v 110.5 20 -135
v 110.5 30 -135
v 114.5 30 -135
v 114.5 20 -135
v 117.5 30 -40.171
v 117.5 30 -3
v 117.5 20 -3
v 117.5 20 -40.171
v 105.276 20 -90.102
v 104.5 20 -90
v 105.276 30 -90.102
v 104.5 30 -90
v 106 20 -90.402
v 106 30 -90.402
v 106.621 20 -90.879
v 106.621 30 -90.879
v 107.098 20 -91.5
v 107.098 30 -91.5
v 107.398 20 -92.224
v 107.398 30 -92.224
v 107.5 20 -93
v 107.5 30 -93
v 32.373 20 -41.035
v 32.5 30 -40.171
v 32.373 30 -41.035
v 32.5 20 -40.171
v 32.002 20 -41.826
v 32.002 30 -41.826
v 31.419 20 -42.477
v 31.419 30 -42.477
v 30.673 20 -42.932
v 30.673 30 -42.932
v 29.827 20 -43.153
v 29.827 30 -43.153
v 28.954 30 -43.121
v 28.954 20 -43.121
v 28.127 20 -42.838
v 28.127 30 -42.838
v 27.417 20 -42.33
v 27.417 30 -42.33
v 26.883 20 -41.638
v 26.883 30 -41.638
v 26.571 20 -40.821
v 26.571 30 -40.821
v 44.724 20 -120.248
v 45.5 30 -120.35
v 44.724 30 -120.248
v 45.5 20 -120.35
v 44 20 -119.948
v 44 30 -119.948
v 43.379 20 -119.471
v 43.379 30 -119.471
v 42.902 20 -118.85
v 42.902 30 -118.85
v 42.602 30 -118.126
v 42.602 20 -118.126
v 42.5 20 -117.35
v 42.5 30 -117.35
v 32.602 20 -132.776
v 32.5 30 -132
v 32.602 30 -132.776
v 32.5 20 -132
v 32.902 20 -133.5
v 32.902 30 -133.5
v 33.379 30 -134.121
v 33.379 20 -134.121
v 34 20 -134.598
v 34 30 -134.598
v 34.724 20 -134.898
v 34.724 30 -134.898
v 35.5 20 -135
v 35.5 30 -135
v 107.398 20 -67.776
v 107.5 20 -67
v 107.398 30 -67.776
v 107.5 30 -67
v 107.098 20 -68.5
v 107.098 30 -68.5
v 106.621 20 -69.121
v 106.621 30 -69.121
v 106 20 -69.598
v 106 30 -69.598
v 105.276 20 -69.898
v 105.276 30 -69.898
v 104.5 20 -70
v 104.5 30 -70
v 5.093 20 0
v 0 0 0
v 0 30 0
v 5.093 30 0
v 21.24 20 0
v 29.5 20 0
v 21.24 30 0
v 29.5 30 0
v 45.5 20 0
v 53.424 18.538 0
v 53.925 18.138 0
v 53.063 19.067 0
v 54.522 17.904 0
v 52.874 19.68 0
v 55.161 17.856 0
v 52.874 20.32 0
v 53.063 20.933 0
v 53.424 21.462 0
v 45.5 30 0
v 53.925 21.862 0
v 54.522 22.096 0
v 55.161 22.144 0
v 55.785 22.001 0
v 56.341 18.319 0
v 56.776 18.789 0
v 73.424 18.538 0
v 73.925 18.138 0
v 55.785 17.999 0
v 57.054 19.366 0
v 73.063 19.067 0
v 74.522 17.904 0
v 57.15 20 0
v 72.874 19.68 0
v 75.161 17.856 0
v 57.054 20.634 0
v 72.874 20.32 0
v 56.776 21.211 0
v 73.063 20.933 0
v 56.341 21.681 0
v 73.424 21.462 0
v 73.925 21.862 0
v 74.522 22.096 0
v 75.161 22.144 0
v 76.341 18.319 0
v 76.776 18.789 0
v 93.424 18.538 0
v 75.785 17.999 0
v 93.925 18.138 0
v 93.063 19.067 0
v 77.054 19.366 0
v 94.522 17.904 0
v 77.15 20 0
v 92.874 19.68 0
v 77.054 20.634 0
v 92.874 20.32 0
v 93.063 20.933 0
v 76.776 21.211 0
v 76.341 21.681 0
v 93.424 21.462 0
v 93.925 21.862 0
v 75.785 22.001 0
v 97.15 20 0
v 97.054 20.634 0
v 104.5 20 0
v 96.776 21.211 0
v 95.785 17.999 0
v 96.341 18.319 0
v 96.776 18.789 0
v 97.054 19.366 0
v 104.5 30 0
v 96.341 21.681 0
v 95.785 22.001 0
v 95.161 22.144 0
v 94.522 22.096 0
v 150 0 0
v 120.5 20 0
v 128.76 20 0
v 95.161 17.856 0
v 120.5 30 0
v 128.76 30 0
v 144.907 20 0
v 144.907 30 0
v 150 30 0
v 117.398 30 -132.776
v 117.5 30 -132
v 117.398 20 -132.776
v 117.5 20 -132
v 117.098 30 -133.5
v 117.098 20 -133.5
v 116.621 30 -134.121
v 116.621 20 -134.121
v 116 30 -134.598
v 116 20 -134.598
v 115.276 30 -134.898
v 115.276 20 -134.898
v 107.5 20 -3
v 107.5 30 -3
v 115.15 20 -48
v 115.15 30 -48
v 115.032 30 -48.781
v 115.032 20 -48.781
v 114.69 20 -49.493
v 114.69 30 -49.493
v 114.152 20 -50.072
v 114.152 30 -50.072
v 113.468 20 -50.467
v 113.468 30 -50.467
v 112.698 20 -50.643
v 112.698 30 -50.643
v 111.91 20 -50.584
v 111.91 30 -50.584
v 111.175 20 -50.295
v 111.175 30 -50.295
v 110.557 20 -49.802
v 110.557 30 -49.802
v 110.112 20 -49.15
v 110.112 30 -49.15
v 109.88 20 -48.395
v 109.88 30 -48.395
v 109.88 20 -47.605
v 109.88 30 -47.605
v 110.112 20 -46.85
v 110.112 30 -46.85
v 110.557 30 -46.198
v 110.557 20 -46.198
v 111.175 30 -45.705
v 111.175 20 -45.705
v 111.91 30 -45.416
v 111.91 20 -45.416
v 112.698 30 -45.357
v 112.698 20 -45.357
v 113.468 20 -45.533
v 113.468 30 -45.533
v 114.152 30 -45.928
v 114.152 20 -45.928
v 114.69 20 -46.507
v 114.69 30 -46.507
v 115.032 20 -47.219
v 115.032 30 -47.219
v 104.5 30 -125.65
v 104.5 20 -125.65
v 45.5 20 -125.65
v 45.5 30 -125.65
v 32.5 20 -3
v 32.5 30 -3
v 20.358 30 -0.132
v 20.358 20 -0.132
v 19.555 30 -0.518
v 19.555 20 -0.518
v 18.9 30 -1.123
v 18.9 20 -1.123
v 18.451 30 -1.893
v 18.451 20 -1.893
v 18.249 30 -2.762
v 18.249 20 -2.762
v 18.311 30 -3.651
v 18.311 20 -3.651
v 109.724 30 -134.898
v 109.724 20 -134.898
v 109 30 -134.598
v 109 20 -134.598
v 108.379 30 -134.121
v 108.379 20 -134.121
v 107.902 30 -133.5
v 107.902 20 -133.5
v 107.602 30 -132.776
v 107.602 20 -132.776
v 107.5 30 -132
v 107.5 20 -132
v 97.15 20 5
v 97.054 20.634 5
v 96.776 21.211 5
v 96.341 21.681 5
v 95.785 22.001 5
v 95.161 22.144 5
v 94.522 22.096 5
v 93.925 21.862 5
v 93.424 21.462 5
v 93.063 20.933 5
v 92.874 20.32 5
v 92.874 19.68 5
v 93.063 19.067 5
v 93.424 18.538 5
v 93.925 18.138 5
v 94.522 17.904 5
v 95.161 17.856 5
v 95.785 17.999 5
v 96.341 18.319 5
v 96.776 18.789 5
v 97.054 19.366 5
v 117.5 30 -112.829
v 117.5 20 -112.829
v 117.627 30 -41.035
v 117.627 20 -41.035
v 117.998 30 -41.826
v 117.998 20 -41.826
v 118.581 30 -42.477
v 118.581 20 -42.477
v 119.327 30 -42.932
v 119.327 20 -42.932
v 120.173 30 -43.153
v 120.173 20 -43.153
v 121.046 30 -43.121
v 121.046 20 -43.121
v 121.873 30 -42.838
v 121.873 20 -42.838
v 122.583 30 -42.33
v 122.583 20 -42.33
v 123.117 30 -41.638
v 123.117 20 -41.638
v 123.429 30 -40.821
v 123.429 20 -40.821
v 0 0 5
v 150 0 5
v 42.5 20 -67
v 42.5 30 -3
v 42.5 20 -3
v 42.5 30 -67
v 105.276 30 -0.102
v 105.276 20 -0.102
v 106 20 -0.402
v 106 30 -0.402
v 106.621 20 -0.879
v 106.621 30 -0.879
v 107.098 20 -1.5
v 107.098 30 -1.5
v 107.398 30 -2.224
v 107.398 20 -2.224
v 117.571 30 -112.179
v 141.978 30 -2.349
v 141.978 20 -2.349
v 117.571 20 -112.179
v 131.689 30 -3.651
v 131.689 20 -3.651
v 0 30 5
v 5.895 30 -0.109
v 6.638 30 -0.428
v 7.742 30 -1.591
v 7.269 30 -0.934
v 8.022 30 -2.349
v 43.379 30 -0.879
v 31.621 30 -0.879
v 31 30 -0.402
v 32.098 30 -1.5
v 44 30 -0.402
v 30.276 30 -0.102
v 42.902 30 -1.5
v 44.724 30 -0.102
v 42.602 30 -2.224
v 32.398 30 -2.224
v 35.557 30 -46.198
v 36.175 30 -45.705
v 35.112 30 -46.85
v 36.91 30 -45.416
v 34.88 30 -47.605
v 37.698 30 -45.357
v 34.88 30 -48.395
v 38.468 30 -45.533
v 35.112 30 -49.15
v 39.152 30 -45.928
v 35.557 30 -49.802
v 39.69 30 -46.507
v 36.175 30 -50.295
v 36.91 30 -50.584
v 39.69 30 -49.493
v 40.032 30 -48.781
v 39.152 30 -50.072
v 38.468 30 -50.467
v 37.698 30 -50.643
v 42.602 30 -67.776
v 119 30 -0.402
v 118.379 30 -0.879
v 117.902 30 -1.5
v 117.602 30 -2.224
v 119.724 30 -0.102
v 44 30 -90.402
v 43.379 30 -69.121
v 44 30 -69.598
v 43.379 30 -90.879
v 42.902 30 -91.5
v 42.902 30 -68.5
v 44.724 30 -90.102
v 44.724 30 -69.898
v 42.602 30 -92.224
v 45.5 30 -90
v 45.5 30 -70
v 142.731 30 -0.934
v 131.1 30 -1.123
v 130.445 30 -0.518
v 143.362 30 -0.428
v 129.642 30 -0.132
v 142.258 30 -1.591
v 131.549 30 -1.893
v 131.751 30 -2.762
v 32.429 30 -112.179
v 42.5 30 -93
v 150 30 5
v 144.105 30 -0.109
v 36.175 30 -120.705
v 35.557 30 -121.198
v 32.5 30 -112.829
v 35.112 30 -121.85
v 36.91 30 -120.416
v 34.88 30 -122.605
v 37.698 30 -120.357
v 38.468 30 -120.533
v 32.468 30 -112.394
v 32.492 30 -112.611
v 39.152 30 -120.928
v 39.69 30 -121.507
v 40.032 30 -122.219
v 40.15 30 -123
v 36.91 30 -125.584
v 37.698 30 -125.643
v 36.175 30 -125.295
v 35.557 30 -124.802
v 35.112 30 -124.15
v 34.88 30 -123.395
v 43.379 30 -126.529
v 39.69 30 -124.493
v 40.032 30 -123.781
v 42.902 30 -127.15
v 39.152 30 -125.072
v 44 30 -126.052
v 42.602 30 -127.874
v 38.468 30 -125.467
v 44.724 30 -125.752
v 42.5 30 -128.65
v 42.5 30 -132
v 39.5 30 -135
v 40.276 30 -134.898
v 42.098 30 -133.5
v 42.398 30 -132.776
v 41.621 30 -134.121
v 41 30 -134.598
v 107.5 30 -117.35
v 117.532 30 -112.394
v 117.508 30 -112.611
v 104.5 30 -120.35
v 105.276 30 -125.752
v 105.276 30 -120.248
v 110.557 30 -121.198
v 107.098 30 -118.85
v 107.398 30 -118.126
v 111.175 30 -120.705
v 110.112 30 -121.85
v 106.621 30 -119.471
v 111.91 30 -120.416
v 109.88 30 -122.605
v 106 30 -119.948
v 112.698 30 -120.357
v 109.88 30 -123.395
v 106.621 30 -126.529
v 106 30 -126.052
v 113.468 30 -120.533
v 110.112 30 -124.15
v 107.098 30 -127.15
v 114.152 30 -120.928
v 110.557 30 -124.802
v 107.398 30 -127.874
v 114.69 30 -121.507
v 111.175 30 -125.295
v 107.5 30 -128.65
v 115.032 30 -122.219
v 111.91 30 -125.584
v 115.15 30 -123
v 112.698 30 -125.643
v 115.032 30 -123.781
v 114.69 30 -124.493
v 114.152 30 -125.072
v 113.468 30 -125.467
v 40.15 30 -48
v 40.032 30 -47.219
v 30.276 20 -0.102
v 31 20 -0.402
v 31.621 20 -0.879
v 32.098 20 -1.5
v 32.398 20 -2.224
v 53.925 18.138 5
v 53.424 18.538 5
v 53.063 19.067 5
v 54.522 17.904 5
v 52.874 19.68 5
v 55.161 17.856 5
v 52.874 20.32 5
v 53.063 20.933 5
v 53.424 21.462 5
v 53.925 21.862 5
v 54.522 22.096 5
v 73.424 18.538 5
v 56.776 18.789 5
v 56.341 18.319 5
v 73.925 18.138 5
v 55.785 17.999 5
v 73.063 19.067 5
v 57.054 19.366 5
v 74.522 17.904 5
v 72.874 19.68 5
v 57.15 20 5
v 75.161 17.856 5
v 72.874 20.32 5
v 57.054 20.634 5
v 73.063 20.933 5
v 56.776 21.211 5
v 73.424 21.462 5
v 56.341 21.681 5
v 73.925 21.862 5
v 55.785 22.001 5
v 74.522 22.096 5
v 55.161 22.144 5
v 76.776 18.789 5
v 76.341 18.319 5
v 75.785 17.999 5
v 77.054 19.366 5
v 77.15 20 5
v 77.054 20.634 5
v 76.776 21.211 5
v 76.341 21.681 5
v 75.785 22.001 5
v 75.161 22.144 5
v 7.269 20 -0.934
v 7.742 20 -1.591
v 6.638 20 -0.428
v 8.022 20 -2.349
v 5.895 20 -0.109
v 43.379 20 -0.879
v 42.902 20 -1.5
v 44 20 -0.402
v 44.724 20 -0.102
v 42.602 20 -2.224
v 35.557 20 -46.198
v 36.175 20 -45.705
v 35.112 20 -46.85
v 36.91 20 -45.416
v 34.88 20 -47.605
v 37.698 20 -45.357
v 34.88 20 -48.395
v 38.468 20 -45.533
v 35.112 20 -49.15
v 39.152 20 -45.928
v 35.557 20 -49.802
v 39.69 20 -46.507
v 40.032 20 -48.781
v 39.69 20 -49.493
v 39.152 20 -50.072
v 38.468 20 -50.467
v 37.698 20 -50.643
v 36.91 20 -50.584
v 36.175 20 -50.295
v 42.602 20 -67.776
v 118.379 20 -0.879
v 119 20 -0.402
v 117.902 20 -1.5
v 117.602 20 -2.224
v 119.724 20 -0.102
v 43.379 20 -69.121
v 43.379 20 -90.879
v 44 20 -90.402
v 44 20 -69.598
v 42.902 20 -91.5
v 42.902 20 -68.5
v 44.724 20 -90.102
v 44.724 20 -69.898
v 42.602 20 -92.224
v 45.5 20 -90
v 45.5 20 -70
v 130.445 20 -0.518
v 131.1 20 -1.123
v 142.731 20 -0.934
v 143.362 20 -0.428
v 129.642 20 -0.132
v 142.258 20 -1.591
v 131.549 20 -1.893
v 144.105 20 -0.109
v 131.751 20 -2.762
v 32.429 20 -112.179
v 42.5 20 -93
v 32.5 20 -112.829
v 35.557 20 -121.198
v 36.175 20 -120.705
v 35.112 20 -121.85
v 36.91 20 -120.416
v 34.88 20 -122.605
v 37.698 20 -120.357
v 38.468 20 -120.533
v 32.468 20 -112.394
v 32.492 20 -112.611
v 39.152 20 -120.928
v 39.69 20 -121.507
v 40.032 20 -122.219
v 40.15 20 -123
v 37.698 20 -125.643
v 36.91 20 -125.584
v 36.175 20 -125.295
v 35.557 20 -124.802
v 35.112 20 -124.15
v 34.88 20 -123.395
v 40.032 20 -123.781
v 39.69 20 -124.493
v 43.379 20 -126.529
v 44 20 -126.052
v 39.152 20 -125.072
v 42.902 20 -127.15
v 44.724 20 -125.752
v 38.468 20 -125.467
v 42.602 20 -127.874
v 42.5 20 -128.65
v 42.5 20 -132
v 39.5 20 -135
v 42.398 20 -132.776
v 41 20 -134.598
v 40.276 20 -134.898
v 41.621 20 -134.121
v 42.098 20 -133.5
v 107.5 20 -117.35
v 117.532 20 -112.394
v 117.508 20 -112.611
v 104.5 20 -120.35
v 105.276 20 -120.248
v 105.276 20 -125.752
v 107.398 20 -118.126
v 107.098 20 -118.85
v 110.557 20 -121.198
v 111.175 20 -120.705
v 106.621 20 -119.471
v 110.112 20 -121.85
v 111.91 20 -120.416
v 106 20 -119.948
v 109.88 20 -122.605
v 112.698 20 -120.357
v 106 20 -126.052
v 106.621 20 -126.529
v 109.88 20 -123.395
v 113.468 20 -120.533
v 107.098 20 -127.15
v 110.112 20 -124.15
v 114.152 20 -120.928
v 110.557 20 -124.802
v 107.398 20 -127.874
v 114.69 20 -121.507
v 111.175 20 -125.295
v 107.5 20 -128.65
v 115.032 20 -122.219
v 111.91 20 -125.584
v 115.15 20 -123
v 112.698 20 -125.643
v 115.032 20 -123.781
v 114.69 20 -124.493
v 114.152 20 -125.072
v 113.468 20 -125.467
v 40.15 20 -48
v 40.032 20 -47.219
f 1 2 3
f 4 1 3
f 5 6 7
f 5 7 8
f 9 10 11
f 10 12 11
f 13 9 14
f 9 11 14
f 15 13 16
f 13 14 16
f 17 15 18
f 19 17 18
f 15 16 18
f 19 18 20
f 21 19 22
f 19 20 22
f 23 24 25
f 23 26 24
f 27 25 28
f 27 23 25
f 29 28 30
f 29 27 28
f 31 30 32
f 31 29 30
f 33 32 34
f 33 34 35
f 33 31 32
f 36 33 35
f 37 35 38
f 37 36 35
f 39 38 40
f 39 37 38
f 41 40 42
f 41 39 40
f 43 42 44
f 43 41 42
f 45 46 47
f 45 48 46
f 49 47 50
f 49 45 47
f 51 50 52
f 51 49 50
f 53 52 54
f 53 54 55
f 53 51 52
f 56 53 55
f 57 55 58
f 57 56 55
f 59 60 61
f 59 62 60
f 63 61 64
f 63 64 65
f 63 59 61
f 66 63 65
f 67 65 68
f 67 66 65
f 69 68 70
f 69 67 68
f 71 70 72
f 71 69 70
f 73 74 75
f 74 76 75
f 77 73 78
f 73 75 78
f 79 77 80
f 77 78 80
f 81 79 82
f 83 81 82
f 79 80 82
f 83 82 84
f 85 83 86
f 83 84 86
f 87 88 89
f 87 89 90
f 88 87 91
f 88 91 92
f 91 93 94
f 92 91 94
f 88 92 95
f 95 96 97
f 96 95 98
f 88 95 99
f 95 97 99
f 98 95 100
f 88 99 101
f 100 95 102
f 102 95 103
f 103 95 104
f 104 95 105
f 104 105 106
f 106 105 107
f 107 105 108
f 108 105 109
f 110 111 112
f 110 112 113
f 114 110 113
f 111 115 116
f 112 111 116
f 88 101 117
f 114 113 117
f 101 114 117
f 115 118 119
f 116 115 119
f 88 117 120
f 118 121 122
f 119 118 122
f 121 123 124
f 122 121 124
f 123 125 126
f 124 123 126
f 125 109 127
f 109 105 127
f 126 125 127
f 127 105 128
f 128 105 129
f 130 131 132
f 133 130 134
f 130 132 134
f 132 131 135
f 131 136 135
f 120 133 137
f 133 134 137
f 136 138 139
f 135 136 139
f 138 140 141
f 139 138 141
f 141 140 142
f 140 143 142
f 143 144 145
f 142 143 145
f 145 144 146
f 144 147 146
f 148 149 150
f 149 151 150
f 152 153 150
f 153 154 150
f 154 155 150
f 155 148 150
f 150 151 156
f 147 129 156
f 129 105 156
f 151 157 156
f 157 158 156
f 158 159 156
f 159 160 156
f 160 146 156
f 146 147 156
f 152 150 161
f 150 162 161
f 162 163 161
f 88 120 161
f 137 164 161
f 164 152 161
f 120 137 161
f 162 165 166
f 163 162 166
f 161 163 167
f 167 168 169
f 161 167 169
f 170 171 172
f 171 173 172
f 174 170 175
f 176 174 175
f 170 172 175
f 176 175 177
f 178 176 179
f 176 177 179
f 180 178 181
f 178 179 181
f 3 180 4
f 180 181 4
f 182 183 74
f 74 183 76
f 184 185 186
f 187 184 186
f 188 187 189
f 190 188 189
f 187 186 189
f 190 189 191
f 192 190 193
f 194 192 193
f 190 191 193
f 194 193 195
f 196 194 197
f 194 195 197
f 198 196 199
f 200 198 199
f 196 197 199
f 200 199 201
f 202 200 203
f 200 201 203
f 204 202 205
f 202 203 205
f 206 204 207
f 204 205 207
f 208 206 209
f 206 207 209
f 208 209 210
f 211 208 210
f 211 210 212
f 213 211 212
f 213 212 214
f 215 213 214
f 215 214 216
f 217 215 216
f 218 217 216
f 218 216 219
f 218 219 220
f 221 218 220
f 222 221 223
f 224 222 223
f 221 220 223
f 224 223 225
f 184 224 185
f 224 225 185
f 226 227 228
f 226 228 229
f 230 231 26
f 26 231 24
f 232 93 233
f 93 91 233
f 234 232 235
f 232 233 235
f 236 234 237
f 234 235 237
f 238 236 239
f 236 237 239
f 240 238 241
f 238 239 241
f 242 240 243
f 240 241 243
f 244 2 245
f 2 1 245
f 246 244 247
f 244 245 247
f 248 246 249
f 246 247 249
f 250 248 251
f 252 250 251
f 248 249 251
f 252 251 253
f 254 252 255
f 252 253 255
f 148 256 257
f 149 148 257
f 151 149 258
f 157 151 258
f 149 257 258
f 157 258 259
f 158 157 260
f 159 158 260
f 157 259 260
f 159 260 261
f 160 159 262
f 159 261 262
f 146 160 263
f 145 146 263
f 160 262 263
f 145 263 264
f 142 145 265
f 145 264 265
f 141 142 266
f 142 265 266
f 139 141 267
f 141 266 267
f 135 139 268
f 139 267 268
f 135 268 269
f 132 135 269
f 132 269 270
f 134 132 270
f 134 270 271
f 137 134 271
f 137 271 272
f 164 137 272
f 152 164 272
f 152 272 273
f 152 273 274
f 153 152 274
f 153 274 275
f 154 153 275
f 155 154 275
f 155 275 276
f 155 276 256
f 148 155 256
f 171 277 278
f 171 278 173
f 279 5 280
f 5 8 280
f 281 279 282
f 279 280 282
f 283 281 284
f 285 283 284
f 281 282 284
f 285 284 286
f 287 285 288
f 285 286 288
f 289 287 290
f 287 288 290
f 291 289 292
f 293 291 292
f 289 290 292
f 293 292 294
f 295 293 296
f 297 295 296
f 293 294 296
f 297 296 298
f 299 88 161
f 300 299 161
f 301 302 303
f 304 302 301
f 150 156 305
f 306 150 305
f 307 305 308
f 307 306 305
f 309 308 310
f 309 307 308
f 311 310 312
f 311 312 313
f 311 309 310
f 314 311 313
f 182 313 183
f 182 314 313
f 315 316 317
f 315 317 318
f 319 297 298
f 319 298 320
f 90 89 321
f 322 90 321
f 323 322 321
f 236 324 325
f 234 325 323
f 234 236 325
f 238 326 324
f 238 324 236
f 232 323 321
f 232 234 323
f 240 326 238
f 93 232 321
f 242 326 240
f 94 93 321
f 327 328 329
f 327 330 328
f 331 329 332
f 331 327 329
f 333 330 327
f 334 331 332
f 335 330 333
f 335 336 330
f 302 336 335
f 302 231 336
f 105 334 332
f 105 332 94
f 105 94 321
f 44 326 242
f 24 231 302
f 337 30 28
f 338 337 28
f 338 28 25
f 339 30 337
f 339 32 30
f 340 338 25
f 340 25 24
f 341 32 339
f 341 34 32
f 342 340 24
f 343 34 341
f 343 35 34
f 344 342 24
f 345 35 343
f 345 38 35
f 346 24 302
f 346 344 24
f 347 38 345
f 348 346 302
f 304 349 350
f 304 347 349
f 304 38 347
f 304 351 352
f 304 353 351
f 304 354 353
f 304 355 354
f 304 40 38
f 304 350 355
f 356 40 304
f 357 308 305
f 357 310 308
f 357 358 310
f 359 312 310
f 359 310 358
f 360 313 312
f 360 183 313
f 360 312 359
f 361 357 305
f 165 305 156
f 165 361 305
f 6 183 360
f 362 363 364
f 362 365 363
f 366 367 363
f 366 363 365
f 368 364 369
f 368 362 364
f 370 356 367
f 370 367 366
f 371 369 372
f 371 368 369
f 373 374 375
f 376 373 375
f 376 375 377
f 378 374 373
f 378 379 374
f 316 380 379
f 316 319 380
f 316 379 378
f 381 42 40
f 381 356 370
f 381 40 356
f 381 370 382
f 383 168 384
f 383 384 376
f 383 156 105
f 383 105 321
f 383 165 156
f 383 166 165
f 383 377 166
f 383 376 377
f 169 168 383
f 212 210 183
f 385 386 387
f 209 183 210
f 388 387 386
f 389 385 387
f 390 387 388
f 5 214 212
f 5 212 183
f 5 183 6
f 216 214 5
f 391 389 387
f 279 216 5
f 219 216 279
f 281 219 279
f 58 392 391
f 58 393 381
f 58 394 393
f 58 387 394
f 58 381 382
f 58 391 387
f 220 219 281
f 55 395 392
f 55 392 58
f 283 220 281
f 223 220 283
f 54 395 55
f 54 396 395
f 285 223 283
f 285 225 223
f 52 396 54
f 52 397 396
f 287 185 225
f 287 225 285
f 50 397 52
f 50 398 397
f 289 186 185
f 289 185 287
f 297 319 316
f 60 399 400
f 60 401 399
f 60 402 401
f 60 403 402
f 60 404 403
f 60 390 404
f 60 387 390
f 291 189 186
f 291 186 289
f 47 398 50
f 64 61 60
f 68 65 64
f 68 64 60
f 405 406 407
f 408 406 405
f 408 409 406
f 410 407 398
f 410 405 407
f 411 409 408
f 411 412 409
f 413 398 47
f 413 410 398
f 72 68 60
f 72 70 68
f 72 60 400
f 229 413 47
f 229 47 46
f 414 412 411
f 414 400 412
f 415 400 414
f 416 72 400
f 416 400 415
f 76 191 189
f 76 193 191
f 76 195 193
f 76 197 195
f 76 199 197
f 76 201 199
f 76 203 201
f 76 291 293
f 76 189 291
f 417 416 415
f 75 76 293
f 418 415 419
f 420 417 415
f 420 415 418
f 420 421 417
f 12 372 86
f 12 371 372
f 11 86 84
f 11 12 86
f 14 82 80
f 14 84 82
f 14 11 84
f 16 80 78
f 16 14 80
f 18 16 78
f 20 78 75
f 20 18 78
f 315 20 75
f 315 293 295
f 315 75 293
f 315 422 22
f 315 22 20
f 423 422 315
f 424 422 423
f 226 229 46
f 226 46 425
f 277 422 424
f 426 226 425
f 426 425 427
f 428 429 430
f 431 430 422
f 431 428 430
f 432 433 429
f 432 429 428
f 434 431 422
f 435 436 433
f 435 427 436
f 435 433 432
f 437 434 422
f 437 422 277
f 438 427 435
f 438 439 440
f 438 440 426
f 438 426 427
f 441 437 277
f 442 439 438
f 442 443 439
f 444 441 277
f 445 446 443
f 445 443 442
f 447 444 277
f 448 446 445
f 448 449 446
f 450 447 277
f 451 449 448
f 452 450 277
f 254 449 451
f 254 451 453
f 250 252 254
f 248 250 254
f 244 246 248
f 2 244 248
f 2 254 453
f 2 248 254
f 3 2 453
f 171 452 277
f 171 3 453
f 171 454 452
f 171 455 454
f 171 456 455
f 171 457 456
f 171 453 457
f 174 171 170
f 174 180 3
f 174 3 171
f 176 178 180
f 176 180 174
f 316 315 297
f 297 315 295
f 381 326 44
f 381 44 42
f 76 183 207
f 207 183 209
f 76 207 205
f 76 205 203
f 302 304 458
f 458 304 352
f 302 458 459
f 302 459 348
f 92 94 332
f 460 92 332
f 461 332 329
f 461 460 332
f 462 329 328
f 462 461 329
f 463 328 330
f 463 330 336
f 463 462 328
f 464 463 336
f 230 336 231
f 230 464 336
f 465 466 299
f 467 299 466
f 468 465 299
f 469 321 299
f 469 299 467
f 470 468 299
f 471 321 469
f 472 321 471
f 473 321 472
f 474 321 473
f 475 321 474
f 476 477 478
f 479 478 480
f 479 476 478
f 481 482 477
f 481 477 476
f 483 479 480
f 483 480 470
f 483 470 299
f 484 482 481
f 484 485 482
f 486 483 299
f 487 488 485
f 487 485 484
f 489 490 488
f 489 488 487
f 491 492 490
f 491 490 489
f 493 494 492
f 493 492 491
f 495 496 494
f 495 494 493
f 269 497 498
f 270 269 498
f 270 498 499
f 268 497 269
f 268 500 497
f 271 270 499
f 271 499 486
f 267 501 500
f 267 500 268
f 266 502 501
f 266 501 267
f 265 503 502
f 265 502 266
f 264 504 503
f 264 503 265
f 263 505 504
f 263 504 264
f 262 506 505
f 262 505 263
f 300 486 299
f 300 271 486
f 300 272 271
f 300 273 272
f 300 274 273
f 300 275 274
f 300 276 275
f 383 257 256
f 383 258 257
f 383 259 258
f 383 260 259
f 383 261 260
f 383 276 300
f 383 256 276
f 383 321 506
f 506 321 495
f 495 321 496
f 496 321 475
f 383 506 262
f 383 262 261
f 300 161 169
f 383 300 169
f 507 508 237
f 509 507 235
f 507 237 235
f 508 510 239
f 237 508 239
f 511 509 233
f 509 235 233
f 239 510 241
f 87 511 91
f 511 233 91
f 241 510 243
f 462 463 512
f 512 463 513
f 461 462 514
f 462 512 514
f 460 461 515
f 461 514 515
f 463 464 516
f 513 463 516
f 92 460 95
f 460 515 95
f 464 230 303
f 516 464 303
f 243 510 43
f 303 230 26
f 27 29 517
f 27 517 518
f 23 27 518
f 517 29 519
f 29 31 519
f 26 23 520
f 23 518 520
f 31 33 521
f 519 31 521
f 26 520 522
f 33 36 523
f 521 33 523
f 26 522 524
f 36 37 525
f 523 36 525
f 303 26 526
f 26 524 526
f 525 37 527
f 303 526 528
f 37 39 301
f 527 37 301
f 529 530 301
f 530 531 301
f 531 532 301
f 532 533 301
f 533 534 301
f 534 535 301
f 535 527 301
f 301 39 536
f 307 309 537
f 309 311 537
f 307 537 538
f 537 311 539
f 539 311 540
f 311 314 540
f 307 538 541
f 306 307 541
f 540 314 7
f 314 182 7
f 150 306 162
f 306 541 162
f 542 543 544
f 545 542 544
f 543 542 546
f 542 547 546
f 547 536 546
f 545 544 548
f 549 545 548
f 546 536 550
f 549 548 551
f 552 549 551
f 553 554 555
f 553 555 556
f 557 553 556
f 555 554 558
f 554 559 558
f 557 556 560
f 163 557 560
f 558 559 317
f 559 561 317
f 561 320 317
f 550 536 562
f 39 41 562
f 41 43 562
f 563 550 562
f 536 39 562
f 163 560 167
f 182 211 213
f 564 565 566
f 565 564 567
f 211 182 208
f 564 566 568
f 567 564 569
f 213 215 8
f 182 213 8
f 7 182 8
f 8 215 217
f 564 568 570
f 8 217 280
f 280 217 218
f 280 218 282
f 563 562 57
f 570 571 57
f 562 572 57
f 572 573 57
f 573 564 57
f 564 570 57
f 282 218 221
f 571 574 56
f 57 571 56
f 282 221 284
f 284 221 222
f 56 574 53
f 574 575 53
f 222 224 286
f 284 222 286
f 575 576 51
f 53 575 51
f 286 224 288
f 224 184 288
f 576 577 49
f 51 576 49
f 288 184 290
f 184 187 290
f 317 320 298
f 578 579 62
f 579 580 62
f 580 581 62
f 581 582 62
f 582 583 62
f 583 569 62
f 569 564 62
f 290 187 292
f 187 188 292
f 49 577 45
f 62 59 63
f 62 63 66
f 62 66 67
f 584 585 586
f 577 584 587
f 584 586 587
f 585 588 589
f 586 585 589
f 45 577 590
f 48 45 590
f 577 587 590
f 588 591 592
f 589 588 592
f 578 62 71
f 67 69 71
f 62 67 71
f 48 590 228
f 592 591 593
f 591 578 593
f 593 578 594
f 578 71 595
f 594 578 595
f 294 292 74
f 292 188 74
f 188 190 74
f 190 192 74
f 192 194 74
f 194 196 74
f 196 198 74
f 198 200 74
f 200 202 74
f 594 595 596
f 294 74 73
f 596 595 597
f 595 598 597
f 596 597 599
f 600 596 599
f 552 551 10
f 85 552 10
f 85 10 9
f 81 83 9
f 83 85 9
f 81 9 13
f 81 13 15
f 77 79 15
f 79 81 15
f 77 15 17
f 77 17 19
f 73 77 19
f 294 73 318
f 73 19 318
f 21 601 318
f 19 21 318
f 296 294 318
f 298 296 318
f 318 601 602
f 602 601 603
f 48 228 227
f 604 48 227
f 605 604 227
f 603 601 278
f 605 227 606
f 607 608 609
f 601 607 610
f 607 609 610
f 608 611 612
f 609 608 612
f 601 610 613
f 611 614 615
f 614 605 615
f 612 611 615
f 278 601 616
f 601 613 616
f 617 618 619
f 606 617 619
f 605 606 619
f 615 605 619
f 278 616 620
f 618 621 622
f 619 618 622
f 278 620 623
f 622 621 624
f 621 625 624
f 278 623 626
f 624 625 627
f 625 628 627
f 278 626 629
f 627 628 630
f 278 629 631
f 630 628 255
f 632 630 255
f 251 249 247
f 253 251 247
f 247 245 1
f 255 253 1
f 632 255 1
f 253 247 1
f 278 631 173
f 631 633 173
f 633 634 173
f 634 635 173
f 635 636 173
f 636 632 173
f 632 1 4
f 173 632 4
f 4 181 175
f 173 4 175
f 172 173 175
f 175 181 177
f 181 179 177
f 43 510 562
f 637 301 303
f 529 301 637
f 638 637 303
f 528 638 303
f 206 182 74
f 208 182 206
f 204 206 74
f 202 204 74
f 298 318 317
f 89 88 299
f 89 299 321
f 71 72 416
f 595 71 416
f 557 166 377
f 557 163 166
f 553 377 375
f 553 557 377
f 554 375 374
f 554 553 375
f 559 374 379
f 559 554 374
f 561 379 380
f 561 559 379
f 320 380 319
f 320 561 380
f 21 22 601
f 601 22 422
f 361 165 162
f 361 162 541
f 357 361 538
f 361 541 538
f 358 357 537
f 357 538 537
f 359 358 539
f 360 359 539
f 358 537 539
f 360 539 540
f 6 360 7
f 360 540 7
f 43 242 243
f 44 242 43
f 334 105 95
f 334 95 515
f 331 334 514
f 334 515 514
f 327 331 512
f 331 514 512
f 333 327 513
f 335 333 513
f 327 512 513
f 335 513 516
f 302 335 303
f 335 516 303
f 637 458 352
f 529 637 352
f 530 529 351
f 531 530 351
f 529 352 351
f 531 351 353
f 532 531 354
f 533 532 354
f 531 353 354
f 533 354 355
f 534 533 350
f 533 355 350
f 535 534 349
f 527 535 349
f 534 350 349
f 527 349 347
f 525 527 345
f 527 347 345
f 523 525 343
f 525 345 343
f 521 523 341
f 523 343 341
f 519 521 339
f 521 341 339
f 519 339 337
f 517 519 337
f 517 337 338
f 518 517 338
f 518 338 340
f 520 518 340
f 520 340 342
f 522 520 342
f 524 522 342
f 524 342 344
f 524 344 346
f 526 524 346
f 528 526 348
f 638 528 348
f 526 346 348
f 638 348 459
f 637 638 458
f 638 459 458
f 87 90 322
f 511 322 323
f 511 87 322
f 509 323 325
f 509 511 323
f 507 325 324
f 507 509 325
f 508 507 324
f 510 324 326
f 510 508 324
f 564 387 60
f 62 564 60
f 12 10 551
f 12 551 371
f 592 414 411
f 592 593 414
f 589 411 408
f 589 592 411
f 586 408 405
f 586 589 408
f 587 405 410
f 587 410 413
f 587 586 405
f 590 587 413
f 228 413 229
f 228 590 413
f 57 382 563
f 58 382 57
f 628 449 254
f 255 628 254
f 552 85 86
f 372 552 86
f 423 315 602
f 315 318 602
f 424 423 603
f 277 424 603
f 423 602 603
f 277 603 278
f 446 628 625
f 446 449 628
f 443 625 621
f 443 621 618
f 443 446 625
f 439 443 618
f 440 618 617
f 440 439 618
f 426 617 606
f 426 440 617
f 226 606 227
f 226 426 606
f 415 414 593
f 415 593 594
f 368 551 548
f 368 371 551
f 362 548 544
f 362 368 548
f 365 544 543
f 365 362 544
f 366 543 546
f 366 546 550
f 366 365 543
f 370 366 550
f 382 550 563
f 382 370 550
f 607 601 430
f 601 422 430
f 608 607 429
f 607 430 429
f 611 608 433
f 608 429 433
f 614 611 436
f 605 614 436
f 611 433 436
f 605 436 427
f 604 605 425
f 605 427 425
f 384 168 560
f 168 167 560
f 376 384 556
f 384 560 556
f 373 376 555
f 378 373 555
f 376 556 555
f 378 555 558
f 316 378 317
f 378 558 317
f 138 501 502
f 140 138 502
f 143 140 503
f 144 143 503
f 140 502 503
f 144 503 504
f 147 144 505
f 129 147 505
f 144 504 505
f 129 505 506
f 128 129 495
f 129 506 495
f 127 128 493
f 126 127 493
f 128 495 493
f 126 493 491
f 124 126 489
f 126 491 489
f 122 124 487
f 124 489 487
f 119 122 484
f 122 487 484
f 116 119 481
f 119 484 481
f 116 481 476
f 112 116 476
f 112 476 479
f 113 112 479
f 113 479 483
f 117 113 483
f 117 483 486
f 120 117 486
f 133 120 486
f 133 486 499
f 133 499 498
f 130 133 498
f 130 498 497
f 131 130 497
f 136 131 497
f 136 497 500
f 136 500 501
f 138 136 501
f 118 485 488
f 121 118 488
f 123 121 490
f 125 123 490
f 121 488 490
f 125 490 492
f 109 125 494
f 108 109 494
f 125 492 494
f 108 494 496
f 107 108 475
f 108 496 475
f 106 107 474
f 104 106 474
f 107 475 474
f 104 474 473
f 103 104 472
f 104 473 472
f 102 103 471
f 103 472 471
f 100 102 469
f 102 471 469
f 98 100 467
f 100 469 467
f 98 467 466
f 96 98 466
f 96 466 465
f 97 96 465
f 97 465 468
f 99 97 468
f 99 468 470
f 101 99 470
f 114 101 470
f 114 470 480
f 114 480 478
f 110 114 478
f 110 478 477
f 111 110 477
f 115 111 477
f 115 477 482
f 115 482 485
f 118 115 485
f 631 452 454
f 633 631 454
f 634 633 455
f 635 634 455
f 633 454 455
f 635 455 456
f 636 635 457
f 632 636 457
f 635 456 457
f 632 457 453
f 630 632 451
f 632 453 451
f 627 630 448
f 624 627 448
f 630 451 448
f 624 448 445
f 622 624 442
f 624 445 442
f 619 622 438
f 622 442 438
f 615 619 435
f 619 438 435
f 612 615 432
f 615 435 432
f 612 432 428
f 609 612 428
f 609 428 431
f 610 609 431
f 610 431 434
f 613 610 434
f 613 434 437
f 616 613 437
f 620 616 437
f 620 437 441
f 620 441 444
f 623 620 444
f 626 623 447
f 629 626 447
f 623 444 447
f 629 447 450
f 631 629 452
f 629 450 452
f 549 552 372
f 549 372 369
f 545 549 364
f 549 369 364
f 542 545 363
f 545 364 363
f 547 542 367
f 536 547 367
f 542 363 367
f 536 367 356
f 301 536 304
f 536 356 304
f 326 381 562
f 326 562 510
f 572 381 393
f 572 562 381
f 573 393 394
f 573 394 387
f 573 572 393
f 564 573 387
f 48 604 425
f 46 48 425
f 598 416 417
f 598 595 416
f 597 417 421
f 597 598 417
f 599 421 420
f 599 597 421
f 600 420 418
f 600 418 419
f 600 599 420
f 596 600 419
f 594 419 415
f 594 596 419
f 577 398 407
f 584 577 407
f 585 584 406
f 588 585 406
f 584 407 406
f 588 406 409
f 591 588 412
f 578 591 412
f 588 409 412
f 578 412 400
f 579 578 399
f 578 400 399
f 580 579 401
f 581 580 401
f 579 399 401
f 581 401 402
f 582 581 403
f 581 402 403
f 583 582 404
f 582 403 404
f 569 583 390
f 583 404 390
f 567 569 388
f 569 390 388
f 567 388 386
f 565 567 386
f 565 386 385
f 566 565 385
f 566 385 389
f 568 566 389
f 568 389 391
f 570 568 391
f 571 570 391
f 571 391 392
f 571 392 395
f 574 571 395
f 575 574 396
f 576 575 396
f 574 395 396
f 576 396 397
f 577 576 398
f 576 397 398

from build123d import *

# Parameters (mm, degrees)
SKETCH1_W           = 150
SKETCH1_H           = 30
BOSS_EXTRUDE1_DEPTH = 5
SKETCH2_R           = 2.15
CUT_EXTRUDE1_DEPTH  = 6
SKETCH3_W           = 10
SKETCH3_H           = 135
BOSS_EXTRUDE2_DEPTH = 10
BOSS_EXTRUDE3_DEPTH = 10
SKETCH6_W           = 20
SKETCH6_H           = 10
BOSS_EXTRUDE4_DEPTH = 65
SKETCH5_R           = 2.65
CUT_EXTRUDE3_DEPTH  = 10
BOSS_EXTRUDE5_REACH = 109.5
SKETCH7_W           = 5.3
SKETCH7_H           = 10
FILLET1_R           = 3
FILLET2_R           = 3


with BuildPart() as part:
    # Sketch1 → Boss-Extrude1 (new body)
    with BuildSketch(Plane.XY):
        with Locations((75, 15)):
            Rectangle(SKETCH1_W, SKETCH1_H)
    extrude(amount=BOSS_EXTRUDE1_DEPTH)

    # Sketch2 → Cut-Extrude1 (cut, through all)
    with BuildSketch(Plane.XY.offset(5)):
        with Locations((75, 20)):
            Circle(SKETCH2_R)
        with Locations((55, 20)):
            Circle(SKETCH2_R)
        with Locations((95, 20)):
            Circle(SKETCH2_R)
    extrude(amount=-CUT_EXTRUDE1_DEPTH, mode=Mode.SUBTRACT)

    # Sketch3 → Boss-Extrude2 (add)
    with BuildSketch(Plane(origin=(0, 30, 0), x_dir=(1, 0, 0), z_dir=(0, 1, 0))):
        with Locations((112.5, 67.5)):
            Rectangle(SKETCH3_W, SKETCH3_H)
        with Locations((37.5, 67.5)):
            Rectangle(SKETCH3_W, SKETCH3_H)
    extrude(amount=-BOSS_EXTRUDE2_DEPTH)

    # Sketch4 → Boss-Extrude3 (add)
    with BuildSketch(Plane(origin=(0, 30, 0), x_dir=(1, 0, 0), z_dir=(0, 1, 0))):
        Polygon((32.5, 67.5), (32.5, 112.5), (7.5, 0), (17.5, 0), align=None)
        Polygon((117.5, 112.5), (117.5, 67.5), (132.5, 0), (142.5, 0), align=None)
    extrude(amount=-BOSS_EXTRUDE3_DEPTH)

    # Sketch6 → Boss-Extrude4 (add)
    with BuildSketch(Plane.ZY.offset(-107.5)):
        with Locations((-80, 25)):
            Rectangle(SKETCH6_W, SKETCH6_H)
    extrude(amount=BOSS_EXTRUDE4_DEPTH)

    # Sketch5 → Cut-Extrude3 (cut)
    with BuildSketch(Plane(origin=(0, 30, 0), x_dir=(1, 0, 0), z_dir=(0, 1, 0))):
        with Locations((37.5, 48)):
            Circle(SKETCH5_R)
        with Locations((112.5, 48)):
            Circle(SKETCH5_R)
        with Locations((112.5, 123)):
            Circle(SKETCH5_R)
        with Locations((37.5, 123)):
            Circle(SKETCH5_R)
    extrude(amount=-CUT_EXTRUDE3_DEPTH, mode=Mode.SUBTRACT)

    # Sketch7 → Boss-Extrude5 (add, up to next)
    with BuildSketch(Plane.ZY.offset(-107.5), mode=Mode.PRIVATE) as boss_extrude5_sk1:
        with Locations((-123, 25)):
            Rectangle(SKETCH7_W, SKETCH7_H)
    boss_extrude5_tool1 = extrude(boss_extrude5_sk1.sketch, amount=BOSS_EXTRUDE5_REACH, mode=Mode.PRIVATE) - part.part
    add(boss_extrude5_tool1.solids().sort_by_distance((107.5, 25, -123))[0])

    # Fillet1
    fillet1_edges = [part.edges().sort_by_distance(p)[0] for p in [
        (42.5, 25, -125.65),
        (107.5, 25, -125.65),
        (32.5, 25, -135),
        (42.5, 25, -135),
        (42.5, 25, 0),
        (32.5, 25, 0),
        (117.5, 25, 0),
        (107.5, 25, 0),
        (107.5, 25, -135),
        (117.5, 25, -135),
        (32.5, 25, -67.5),
        (32.5, 25, -112.5),
        (7.5, 25, 0),
        (17.5, 25, 0),
        (117.5, 25, -112.5),
        (142.5, 25, 0),
        (132.5, 25, 0),
        (117.5, 25, -67.5),
        (42.5, 25, -70),
        (107.5, 25, -70),
    ]]
    fillet(fillet1_edges, radius=FILLET1_R)

    # Fillet2
    fillet2_edges = [part.edges().sort_by_distance(p)[0] for p in [
        (42.5, 25, -120.35),
        (107.5, 25, -120.35),
        (42.5, 25, -90),
        (107.5, 25, -90),
    ]]
    fillet(fillet2_edges, radius=FILLET2_R)


solid = part.part
